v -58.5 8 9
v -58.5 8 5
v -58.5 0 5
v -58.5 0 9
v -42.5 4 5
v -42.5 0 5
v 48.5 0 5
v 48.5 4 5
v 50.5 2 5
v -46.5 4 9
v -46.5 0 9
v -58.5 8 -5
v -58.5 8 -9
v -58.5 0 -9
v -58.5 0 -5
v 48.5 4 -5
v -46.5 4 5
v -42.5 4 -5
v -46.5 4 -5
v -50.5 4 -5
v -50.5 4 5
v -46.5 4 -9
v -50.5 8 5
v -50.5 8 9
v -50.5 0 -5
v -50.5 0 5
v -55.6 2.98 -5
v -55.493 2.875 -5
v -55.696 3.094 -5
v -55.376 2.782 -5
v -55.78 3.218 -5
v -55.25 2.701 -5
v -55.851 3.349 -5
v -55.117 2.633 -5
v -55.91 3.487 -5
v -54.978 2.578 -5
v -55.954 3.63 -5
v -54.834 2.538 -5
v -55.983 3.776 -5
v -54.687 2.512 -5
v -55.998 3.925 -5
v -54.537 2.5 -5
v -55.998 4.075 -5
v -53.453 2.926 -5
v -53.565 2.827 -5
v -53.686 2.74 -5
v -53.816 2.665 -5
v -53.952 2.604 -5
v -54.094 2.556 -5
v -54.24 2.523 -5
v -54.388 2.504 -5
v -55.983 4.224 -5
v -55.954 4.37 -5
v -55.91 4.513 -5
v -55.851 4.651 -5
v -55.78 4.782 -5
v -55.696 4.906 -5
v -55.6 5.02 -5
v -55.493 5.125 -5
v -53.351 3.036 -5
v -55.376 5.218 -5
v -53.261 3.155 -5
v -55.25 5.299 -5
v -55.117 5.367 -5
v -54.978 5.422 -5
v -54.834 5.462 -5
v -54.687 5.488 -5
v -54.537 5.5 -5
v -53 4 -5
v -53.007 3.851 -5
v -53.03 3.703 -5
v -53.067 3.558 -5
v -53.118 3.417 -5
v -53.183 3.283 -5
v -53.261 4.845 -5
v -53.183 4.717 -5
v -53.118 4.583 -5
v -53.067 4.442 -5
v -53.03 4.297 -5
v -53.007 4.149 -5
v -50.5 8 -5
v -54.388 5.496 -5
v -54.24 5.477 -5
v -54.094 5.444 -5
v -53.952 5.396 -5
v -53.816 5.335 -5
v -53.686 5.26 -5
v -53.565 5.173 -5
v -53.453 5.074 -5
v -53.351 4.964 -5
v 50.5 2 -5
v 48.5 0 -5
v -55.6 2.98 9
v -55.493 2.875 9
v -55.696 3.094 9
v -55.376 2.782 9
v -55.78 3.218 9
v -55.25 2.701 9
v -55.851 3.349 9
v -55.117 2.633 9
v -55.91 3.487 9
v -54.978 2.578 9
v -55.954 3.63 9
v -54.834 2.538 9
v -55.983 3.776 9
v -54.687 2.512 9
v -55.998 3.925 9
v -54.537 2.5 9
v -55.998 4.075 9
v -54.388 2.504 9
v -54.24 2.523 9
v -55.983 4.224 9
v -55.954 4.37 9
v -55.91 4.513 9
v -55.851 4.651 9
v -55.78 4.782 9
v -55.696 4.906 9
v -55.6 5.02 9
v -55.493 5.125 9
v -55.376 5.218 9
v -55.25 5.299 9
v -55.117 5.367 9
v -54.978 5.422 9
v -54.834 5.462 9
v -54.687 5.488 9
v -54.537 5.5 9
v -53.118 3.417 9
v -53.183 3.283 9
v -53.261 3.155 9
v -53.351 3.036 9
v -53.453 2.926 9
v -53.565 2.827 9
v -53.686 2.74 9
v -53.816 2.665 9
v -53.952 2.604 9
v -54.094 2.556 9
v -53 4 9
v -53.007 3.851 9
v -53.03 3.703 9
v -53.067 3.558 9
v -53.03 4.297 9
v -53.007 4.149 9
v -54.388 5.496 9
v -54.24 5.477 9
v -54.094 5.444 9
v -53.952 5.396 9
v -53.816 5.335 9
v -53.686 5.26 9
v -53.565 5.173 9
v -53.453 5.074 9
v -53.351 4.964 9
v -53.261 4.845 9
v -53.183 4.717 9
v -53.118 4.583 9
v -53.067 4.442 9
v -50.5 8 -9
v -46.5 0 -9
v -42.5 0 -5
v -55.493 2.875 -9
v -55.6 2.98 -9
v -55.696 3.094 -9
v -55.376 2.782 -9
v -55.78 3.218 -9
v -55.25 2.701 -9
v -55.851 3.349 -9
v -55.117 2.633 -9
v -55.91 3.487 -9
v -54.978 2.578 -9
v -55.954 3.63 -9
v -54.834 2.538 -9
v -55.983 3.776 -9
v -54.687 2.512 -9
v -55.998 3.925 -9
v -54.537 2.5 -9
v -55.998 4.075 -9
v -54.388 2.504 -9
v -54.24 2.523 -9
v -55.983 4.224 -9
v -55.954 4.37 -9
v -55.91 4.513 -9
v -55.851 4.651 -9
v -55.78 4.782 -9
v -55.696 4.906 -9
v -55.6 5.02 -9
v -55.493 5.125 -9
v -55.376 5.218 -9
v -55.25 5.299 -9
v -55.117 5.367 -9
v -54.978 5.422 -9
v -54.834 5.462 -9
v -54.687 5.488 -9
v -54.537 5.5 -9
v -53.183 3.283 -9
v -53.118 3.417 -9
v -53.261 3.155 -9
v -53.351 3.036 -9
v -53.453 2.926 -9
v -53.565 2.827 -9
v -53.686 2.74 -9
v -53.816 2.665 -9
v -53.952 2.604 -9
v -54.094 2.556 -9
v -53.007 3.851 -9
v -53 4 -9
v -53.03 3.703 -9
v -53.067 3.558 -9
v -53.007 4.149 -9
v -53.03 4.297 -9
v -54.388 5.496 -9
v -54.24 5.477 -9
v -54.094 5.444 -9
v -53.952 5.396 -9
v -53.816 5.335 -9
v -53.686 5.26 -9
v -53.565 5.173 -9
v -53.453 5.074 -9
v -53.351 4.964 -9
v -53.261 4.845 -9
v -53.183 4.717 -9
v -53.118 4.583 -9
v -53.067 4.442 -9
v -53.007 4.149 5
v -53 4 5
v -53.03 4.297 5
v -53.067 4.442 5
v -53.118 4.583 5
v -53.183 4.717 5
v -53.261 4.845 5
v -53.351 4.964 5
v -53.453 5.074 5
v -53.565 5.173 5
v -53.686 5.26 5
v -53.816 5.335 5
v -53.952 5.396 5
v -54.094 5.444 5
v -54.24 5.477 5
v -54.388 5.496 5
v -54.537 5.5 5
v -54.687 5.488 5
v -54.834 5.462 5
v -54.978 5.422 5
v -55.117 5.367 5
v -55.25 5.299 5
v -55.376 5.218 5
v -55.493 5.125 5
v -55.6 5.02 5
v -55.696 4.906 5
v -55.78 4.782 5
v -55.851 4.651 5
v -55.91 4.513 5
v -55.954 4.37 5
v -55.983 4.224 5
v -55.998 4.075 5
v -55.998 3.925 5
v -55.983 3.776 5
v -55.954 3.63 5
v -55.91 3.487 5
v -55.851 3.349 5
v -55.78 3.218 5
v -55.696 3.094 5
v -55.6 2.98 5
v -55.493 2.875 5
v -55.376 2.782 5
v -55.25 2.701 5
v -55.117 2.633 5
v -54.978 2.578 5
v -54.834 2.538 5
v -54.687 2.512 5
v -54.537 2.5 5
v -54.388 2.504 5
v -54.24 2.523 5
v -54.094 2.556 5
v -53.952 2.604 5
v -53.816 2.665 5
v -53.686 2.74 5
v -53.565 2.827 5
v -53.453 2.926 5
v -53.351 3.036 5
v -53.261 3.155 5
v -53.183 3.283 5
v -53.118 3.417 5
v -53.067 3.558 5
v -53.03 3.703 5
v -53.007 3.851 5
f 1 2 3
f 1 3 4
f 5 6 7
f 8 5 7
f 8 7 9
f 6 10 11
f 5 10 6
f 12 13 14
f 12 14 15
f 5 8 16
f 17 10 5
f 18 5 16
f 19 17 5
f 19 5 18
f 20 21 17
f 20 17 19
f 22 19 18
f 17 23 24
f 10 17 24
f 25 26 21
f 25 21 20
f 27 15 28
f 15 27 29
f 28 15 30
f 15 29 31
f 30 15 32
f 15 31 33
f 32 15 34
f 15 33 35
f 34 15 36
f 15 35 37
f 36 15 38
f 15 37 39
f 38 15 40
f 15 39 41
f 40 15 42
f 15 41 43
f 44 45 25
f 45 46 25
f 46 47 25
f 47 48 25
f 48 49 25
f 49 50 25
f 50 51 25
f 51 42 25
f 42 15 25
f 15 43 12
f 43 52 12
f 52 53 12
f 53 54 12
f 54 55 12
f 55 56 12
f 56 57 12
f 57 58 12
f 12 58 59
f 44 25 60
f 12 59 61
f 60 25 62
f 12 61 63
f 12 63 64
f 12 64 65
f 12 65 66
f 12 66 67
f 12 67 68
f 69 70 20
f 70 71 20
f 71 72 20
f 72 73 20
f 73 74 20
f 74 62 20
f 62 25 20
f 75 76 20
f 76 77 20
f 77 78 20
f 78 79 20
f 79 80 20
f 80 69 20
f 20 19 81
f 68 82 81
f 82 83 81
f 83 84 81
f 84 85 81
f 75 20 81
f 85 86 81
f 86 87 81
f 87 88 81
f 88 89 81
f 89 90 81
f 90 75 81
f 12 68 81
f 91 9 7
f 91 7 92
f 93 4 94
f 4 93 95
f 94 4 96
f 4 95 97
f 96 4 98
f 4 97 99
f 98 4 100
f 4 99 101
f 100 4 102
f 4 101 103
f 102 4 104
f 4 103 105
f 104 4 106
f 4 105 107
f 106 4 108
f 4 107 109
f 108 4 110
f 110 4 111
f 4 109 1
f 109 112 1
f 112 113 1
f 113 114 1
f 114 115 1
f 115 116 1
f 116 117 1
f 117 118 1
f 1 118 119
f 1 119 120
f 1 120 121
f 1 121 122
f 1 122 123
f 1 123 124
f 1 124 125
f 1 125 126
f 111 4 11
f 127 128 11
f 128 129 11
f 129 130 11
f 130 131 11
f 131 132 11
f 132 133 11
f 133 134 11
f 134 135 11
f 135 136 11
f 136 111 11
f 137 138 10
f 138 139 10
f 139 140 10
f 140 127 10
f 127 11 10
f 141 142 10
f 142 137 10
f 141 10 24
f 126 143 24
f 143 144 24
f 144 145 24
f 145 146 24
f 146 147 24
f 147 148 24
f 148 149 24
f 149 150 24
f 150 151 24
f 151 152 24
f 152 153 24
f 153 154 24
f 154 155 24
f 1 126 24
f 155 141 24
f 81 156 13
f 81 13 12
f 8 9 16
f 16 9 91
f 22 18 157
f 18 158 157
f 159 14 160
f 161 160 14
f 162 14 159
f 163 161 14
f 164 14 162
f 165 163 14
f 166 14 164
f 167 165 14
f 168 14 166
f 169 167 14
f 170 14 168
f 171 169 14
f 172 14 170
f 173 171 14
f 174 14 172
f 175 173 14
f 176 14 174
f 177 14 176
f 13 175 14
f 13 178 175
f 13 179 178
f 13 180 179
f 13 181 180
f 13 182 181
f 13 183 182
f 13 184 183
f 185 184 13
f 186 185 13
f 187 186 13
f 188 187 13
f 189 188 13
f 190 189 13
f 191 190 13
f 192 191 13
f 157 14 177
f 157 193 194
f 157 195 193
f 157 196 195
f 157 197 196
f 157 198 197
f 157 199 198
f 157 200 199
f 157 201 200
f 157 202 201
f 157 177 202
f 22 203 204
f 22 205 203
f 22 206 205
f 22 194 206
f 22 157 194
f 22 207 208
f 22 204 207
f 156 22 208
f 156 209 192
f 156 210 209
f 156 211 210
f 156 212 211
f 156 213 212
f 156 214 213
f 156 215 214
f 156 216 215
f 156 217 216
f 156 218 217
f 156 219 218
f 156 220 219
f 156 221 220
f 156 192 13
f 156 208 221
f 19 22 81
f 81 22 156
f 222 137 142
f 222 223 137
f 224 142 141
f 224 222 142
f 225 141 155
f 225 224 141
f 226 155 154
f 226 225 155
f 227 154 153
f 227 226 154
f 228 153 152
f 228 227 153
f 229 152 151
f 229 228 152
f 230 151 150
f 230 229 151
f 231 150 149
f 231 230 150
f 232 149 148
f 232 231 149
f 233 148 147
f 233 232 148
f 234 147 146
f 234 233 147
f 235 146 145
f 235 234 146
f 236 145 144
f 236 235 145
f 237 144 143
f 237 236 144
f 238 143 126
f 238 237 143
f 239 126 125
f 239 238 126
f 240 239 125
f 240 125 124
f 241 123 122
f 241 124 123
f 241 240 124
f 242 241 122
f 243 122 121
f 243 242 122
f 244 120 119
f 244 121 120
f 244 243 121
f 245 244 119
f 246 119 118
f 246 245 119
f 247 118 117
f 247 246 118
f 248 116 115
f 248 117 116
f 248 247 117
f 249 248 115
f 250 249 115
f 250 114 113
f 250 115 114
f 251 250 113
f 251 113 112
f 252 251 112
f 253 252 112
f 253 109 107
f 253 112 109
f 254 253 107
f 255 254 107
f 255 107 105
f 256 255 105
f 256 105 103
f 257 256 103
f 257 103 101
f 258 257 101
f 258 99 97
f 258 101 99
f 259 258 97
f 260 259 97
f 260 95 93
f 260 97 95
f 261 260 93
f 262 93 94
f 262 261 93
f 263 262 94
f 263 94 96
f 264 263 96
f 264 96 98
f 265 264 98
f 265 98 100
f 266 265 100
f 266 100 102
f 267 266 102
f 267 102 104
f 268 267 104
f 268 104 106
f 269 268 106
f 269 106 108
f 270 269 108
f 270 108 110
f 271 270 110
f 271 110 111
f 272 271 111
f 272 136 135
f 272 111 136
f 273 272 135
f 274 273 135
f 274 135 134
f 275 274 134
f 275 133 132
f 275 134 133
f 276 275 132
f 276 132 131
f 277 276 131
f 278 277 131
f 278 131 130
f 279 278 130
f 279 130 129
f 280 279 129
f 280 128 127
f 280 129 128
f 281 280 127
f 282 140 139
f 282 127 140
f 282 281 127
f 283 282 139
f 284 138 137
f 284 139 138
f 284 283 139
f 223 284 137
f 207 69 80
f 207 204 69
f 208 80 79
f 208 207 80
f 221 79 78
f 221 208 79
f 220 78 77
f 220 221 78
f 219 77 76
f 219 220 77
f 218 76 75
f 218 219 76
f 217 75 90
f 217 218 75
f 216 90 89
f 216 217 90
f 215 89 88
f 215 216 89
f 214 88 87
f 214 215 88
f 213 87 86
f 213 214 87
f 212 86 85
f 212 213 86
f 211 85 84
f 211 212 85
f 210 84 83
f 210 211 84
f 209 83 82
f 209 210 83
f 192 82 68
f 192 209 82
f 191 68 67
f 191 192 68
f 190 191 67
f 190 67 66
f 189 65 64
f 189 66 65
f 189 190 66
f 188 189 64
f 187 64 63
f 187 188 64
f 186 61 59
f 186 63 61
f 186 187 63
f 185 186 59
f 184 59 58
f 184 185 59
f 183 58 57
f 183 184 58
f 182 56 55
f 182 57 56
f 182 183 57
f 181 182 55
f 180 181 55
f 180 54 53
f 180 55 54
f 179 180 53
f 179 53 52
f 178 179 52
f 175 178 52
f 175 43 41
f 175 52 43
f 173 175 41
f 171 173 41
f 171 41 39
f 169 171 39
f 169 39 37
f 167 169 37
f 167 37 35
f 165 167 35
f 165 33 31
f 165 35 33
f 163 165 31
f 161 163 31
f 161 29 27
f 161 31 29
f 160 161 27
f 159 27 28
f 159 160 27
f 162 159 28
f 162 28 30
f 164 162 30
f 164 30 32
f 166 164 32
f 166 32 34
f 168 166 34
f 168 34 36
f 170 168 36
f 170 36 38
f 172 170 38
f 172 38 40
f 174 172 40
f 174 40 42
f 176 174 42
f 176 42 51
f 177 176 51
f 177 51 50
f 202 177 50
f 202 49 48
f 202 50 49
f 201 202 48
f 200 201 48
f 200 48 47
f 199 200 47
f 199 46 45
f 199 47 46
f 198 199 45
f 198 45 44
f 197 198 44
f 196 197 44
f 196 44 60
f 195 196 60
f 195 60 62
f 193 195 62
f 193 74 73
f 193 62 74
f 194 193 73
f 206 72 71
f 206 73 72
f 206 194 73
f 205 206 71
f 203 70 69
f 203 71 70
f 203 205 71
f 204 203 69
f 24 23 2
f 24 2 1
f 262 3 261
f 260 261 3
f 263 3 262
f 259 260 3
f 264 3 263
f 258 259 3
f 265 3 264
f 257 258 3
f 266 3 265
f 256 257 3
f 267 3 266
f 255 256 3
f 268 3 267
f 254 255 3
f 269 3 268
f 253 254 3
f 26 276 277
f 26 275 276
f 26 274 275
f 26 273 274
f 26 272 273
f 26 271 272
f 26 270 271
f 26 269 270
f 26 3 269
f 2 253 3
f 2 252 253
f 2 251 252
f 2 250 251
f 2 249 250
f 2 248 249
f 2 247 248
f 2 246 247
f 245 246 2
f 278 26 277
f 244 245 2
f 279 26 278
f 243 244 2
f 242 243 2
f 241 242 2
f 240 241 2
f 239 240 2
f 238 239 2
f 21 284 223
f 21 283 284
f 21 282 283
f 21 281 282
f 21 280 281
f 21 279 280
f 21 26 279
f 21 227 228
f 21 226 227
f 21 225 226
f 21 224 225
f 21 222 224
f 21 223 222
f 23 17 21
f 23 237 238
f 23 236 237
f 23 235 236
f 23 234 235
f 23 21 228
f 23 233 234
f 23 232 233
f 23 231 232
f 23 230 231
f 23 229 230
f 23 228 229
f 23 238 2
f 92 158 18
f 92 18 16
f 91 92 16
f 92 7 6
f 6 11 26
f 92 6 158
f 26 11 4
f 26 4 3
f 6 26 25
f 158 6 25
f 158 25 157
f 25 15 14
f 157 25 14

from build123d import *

# Parameters (mm, degrees)
SZKIC1_W                         = 101
SZKIC1_H                         = 10
DODANIE_WYCI_GNI_CIE1_DEPTH      = 4
DODANIE_WYCI_GNI_CIE2_DEPTH      = 8
DODANIE_WYCI_GNI_CIE2_DEPTH_BACK = 4
SZKIC2_W                         = 4
SZKIC2_H                         = 8
SFAZOWANIE1_SIZE                 = 4
SFAZOWANIE2_SIZE                 = 4
WYTNIJ_WYCI_GNI_CIE1_DEPTH       = 62.72722252
WYTNIJ_WYCI_GNI_CIE1_DEPTH_BACK  = 62.72722252
SZKIC4_R                         = 1.5
SFAZOWANIE3_SIZE                 = 2


# Some blends are built 0.0001 mm under size
with BuildPart() as part:
    # Szkic1 → Dodanie-wyciągnięcie1 (new body)
    with BuildSketch(Plane(origin=(0, 0, 0), x_dir=(1, 0, 0), z_dir=(0, 1, 0))):
        Rectangle(SZKIC1_W, SZKIC1_H)
    extrude(amount=DODANIE_WYCI_GNI_CIE1_DEPTH)

    # Szkic2 → Dodanie-wyciągnięcie2 (add, two sides: drawn at the far end of the back side and taken through both)
    with BuildSketch(Plane.ZY.offset(50.5).offset(-DODANIE_WYCI_GNI_CIE2_DEPTH_BACK)):
        with Locations((-7, 4)):
            Rectangle(SZKIC2_W, SZKIC2_H)
        with Locations((7, 4)):
            Rectangle(SZKIC2_W, SZKIC2_H)
    extrude(amount=DODANIE_WYCI_GNI_CIE2_DEPTH + DODANIE_WYCI_GNI_CIE2_DEPTH_BACK)

    # Sfazowanie1
    sfazowanie1_edges = [part.edges().sort_by_distance(p)[0] for p in [
        (-46.5, 8, -7),
        (-46.5, 8, 7),
    ]]
    chamfer(sfazowanie1_edges, length=SFAZOWANIE1_SIZE)

    # Sfazowanie2
    # the kernel refuses this chamfer: 4 mm, written as the material it adds along each edge
    with BuildSketch(Plane(origin=(-46.5, 0, -5), x_dir=(0.9996219169112968, 0, 0.027495876610586296), z_dir=(0, 1, 0))) as sfazowanie2_piece_1_section:
        Polygon((SFAZOWANIE2_SIZE * 0.999621916911, SFAZOWANIE2_SIZE * 0.0274958766106), (-SFAZOWANIE2_SIZE * 0.0274958766106, SFAZOWANIE2_SIZE * 0.999621916911), (0, 0), align=None)
    sfazowanie2_piece_1 = extrude(amount=4, mode=Mode.PRIVATE)
    sfazowanie2_piece_1 = split(sfazowanie2_piece_1, bisect_by=Plane(origin=(-45.556052557, 1.526245094, -9), z_dir=(0, 0, 1)), keep=Keep.TOP, mode=Mode.PRIVATE)
    sfazowanie2_piece_1 = split(sfazowanie2_piece_1, bisect_by=Plane(origin=(-44.791148825, 2.291148825, -6.514062333), z_dir=(-0.7071067811865476, -0.7071067811865476, 0)), keep=Keep.TOP, mode=Mode.PRIVATE)
    add(sfazowanie2_piece_1)
    with BuildSketch(Plane(origin=(-46.5, 0, -5), x_dir=(0.9996219169112968, 0, 0.027495876610586296), z_dir=(0, 1, 0))) as sfazowanie2_piece_2_section:
        Polygon((SFAZOWANIE2_SIZE * 0.999621916911, SFAZOWANIE2_SIZE * 0.0274958766106), (-SFAZOWANIE2_SIZE * 0.0274958766106, SFAZOWANIE2_SIZE * 0.999621916911), (0, 0), align=None)
    sfazowanie2_piece_2 = extrude(amount=4, mode=Mode.PRIVATE)
    sfazowanie2_piece_2 = split(sfazowanie2_piece_2, bisect_by=Plane(origin=(-44.936302596, 2.436302596, -5.911229734), z_dir=(0.7071067811865476, 0.7071067811865476, 0)), keep=Keep.TOP, mode=Mode.PRIVATE)
    add(sfazowanie2_piece_2)
    with BuildSketch(Plane(origin=(-46.5, 4, 5), x_dir=(-0.027495876610585623, 0, 0.9996219169112968), z_dir=(0, -1, 0))) as sfazowanie2_piece_3_section:
        Polygon((SFAZOWANIE2_SIZE * 0.999621916911, -SFAZOWANIE2_SIZE * 0.0274958766106), (-SFAZOWANIE2_SIZE * 0.0274958766106, -SFAZOWANIE2_SIZE * 0.999621916911), (0, 0), align=None)
    sfazowanie2_piece_3 = extrude(amount=4, mode=Mode.PRIVATE)
    sfazowanie2_piece_3 = split(sfazowanie2_piece_3, bisect_by=Plane(origin=(-44.936302596, 2.436302596, 5.911229734), z_dir=(0.7071067811865476, 0.7071067811865476, 0)), keep=Keep.TOP, mode=Mode.PRIVATE)
    add(sfazowanie2_piece_3)
    with BuildSketch(Plane(origin=(-46.5, 4, 5), x_dir=(-0.027495876610585623, 0, 0.9996219169112968), z_dir=(0, -1, 0))) as sfazowanie2_piece_4_section:
        Polygon((SFAZOWANIE2_SIZE * 0.999621916911, -SFAZOWANIE2_SIZE * 0.0274958766106), (-SFAZOWANIE2_SIZE * 0.0274958766106, -SFAZOWANIE2_SIZE * 0.999621916911), (0, 0), align=None)
    sfazowanie2_piece_4 = extrude(amount=4, mode=Mode.PRIVATE)
    sfazowanie2_piece_4 = split(sfazowanie2_piece_4, bisect_by=Plane(origin=(-45.556052557, 1.526245094, 9), z_dir=(0, 0, -1)), keep=Keep.TOP, mode=Mode.PRIVATE)
    sfazowanie2_piece_4 = split(sfazowanie2_piece_4, bisect_by=Plane(origin=(-44.791148825, 2.291148825, 6.514062333), z_dir=(-0.7071067811865476, -0.7071067811865476, 0)), keep=Keep.TOP, mode=Mode.PRIVATE)
    add(sfazowanie2_piece_4)

    # Szkic4 → Wytnij-wyciągnięcie1 (cut, two sides: drawn at the far end of the back side and taken through both)
    with BuildSketch(Plane.XY.offset(9).offset(-WYTNIJ_WYCI_GNI_CIE1_DEPTH_BACK)):
        with Locations((-54.5, 4)):
            Circle(SZKIC4_R)
    extrude(amount=WYTNIJ_WYCI_GNI_CIE1_DEPTH + WYTNIJ_WYCI_GNI_CIE1_DEPTH_BACK, mode=Mode.SUBTRACT)

    # Sfazowanie3
    sfazowanie3_edges = [part.edges().sort_by_distance(p)[0] for p in [
        (50.5, 4, 0),
        (50.5, 0, 0),
    ]]
    chamfer(sfazowanie3_edges, length=SFAZOWANIE3_SIZE - 0.0001)  # a hair under: the kernel refuses the full size


solid = part.part
